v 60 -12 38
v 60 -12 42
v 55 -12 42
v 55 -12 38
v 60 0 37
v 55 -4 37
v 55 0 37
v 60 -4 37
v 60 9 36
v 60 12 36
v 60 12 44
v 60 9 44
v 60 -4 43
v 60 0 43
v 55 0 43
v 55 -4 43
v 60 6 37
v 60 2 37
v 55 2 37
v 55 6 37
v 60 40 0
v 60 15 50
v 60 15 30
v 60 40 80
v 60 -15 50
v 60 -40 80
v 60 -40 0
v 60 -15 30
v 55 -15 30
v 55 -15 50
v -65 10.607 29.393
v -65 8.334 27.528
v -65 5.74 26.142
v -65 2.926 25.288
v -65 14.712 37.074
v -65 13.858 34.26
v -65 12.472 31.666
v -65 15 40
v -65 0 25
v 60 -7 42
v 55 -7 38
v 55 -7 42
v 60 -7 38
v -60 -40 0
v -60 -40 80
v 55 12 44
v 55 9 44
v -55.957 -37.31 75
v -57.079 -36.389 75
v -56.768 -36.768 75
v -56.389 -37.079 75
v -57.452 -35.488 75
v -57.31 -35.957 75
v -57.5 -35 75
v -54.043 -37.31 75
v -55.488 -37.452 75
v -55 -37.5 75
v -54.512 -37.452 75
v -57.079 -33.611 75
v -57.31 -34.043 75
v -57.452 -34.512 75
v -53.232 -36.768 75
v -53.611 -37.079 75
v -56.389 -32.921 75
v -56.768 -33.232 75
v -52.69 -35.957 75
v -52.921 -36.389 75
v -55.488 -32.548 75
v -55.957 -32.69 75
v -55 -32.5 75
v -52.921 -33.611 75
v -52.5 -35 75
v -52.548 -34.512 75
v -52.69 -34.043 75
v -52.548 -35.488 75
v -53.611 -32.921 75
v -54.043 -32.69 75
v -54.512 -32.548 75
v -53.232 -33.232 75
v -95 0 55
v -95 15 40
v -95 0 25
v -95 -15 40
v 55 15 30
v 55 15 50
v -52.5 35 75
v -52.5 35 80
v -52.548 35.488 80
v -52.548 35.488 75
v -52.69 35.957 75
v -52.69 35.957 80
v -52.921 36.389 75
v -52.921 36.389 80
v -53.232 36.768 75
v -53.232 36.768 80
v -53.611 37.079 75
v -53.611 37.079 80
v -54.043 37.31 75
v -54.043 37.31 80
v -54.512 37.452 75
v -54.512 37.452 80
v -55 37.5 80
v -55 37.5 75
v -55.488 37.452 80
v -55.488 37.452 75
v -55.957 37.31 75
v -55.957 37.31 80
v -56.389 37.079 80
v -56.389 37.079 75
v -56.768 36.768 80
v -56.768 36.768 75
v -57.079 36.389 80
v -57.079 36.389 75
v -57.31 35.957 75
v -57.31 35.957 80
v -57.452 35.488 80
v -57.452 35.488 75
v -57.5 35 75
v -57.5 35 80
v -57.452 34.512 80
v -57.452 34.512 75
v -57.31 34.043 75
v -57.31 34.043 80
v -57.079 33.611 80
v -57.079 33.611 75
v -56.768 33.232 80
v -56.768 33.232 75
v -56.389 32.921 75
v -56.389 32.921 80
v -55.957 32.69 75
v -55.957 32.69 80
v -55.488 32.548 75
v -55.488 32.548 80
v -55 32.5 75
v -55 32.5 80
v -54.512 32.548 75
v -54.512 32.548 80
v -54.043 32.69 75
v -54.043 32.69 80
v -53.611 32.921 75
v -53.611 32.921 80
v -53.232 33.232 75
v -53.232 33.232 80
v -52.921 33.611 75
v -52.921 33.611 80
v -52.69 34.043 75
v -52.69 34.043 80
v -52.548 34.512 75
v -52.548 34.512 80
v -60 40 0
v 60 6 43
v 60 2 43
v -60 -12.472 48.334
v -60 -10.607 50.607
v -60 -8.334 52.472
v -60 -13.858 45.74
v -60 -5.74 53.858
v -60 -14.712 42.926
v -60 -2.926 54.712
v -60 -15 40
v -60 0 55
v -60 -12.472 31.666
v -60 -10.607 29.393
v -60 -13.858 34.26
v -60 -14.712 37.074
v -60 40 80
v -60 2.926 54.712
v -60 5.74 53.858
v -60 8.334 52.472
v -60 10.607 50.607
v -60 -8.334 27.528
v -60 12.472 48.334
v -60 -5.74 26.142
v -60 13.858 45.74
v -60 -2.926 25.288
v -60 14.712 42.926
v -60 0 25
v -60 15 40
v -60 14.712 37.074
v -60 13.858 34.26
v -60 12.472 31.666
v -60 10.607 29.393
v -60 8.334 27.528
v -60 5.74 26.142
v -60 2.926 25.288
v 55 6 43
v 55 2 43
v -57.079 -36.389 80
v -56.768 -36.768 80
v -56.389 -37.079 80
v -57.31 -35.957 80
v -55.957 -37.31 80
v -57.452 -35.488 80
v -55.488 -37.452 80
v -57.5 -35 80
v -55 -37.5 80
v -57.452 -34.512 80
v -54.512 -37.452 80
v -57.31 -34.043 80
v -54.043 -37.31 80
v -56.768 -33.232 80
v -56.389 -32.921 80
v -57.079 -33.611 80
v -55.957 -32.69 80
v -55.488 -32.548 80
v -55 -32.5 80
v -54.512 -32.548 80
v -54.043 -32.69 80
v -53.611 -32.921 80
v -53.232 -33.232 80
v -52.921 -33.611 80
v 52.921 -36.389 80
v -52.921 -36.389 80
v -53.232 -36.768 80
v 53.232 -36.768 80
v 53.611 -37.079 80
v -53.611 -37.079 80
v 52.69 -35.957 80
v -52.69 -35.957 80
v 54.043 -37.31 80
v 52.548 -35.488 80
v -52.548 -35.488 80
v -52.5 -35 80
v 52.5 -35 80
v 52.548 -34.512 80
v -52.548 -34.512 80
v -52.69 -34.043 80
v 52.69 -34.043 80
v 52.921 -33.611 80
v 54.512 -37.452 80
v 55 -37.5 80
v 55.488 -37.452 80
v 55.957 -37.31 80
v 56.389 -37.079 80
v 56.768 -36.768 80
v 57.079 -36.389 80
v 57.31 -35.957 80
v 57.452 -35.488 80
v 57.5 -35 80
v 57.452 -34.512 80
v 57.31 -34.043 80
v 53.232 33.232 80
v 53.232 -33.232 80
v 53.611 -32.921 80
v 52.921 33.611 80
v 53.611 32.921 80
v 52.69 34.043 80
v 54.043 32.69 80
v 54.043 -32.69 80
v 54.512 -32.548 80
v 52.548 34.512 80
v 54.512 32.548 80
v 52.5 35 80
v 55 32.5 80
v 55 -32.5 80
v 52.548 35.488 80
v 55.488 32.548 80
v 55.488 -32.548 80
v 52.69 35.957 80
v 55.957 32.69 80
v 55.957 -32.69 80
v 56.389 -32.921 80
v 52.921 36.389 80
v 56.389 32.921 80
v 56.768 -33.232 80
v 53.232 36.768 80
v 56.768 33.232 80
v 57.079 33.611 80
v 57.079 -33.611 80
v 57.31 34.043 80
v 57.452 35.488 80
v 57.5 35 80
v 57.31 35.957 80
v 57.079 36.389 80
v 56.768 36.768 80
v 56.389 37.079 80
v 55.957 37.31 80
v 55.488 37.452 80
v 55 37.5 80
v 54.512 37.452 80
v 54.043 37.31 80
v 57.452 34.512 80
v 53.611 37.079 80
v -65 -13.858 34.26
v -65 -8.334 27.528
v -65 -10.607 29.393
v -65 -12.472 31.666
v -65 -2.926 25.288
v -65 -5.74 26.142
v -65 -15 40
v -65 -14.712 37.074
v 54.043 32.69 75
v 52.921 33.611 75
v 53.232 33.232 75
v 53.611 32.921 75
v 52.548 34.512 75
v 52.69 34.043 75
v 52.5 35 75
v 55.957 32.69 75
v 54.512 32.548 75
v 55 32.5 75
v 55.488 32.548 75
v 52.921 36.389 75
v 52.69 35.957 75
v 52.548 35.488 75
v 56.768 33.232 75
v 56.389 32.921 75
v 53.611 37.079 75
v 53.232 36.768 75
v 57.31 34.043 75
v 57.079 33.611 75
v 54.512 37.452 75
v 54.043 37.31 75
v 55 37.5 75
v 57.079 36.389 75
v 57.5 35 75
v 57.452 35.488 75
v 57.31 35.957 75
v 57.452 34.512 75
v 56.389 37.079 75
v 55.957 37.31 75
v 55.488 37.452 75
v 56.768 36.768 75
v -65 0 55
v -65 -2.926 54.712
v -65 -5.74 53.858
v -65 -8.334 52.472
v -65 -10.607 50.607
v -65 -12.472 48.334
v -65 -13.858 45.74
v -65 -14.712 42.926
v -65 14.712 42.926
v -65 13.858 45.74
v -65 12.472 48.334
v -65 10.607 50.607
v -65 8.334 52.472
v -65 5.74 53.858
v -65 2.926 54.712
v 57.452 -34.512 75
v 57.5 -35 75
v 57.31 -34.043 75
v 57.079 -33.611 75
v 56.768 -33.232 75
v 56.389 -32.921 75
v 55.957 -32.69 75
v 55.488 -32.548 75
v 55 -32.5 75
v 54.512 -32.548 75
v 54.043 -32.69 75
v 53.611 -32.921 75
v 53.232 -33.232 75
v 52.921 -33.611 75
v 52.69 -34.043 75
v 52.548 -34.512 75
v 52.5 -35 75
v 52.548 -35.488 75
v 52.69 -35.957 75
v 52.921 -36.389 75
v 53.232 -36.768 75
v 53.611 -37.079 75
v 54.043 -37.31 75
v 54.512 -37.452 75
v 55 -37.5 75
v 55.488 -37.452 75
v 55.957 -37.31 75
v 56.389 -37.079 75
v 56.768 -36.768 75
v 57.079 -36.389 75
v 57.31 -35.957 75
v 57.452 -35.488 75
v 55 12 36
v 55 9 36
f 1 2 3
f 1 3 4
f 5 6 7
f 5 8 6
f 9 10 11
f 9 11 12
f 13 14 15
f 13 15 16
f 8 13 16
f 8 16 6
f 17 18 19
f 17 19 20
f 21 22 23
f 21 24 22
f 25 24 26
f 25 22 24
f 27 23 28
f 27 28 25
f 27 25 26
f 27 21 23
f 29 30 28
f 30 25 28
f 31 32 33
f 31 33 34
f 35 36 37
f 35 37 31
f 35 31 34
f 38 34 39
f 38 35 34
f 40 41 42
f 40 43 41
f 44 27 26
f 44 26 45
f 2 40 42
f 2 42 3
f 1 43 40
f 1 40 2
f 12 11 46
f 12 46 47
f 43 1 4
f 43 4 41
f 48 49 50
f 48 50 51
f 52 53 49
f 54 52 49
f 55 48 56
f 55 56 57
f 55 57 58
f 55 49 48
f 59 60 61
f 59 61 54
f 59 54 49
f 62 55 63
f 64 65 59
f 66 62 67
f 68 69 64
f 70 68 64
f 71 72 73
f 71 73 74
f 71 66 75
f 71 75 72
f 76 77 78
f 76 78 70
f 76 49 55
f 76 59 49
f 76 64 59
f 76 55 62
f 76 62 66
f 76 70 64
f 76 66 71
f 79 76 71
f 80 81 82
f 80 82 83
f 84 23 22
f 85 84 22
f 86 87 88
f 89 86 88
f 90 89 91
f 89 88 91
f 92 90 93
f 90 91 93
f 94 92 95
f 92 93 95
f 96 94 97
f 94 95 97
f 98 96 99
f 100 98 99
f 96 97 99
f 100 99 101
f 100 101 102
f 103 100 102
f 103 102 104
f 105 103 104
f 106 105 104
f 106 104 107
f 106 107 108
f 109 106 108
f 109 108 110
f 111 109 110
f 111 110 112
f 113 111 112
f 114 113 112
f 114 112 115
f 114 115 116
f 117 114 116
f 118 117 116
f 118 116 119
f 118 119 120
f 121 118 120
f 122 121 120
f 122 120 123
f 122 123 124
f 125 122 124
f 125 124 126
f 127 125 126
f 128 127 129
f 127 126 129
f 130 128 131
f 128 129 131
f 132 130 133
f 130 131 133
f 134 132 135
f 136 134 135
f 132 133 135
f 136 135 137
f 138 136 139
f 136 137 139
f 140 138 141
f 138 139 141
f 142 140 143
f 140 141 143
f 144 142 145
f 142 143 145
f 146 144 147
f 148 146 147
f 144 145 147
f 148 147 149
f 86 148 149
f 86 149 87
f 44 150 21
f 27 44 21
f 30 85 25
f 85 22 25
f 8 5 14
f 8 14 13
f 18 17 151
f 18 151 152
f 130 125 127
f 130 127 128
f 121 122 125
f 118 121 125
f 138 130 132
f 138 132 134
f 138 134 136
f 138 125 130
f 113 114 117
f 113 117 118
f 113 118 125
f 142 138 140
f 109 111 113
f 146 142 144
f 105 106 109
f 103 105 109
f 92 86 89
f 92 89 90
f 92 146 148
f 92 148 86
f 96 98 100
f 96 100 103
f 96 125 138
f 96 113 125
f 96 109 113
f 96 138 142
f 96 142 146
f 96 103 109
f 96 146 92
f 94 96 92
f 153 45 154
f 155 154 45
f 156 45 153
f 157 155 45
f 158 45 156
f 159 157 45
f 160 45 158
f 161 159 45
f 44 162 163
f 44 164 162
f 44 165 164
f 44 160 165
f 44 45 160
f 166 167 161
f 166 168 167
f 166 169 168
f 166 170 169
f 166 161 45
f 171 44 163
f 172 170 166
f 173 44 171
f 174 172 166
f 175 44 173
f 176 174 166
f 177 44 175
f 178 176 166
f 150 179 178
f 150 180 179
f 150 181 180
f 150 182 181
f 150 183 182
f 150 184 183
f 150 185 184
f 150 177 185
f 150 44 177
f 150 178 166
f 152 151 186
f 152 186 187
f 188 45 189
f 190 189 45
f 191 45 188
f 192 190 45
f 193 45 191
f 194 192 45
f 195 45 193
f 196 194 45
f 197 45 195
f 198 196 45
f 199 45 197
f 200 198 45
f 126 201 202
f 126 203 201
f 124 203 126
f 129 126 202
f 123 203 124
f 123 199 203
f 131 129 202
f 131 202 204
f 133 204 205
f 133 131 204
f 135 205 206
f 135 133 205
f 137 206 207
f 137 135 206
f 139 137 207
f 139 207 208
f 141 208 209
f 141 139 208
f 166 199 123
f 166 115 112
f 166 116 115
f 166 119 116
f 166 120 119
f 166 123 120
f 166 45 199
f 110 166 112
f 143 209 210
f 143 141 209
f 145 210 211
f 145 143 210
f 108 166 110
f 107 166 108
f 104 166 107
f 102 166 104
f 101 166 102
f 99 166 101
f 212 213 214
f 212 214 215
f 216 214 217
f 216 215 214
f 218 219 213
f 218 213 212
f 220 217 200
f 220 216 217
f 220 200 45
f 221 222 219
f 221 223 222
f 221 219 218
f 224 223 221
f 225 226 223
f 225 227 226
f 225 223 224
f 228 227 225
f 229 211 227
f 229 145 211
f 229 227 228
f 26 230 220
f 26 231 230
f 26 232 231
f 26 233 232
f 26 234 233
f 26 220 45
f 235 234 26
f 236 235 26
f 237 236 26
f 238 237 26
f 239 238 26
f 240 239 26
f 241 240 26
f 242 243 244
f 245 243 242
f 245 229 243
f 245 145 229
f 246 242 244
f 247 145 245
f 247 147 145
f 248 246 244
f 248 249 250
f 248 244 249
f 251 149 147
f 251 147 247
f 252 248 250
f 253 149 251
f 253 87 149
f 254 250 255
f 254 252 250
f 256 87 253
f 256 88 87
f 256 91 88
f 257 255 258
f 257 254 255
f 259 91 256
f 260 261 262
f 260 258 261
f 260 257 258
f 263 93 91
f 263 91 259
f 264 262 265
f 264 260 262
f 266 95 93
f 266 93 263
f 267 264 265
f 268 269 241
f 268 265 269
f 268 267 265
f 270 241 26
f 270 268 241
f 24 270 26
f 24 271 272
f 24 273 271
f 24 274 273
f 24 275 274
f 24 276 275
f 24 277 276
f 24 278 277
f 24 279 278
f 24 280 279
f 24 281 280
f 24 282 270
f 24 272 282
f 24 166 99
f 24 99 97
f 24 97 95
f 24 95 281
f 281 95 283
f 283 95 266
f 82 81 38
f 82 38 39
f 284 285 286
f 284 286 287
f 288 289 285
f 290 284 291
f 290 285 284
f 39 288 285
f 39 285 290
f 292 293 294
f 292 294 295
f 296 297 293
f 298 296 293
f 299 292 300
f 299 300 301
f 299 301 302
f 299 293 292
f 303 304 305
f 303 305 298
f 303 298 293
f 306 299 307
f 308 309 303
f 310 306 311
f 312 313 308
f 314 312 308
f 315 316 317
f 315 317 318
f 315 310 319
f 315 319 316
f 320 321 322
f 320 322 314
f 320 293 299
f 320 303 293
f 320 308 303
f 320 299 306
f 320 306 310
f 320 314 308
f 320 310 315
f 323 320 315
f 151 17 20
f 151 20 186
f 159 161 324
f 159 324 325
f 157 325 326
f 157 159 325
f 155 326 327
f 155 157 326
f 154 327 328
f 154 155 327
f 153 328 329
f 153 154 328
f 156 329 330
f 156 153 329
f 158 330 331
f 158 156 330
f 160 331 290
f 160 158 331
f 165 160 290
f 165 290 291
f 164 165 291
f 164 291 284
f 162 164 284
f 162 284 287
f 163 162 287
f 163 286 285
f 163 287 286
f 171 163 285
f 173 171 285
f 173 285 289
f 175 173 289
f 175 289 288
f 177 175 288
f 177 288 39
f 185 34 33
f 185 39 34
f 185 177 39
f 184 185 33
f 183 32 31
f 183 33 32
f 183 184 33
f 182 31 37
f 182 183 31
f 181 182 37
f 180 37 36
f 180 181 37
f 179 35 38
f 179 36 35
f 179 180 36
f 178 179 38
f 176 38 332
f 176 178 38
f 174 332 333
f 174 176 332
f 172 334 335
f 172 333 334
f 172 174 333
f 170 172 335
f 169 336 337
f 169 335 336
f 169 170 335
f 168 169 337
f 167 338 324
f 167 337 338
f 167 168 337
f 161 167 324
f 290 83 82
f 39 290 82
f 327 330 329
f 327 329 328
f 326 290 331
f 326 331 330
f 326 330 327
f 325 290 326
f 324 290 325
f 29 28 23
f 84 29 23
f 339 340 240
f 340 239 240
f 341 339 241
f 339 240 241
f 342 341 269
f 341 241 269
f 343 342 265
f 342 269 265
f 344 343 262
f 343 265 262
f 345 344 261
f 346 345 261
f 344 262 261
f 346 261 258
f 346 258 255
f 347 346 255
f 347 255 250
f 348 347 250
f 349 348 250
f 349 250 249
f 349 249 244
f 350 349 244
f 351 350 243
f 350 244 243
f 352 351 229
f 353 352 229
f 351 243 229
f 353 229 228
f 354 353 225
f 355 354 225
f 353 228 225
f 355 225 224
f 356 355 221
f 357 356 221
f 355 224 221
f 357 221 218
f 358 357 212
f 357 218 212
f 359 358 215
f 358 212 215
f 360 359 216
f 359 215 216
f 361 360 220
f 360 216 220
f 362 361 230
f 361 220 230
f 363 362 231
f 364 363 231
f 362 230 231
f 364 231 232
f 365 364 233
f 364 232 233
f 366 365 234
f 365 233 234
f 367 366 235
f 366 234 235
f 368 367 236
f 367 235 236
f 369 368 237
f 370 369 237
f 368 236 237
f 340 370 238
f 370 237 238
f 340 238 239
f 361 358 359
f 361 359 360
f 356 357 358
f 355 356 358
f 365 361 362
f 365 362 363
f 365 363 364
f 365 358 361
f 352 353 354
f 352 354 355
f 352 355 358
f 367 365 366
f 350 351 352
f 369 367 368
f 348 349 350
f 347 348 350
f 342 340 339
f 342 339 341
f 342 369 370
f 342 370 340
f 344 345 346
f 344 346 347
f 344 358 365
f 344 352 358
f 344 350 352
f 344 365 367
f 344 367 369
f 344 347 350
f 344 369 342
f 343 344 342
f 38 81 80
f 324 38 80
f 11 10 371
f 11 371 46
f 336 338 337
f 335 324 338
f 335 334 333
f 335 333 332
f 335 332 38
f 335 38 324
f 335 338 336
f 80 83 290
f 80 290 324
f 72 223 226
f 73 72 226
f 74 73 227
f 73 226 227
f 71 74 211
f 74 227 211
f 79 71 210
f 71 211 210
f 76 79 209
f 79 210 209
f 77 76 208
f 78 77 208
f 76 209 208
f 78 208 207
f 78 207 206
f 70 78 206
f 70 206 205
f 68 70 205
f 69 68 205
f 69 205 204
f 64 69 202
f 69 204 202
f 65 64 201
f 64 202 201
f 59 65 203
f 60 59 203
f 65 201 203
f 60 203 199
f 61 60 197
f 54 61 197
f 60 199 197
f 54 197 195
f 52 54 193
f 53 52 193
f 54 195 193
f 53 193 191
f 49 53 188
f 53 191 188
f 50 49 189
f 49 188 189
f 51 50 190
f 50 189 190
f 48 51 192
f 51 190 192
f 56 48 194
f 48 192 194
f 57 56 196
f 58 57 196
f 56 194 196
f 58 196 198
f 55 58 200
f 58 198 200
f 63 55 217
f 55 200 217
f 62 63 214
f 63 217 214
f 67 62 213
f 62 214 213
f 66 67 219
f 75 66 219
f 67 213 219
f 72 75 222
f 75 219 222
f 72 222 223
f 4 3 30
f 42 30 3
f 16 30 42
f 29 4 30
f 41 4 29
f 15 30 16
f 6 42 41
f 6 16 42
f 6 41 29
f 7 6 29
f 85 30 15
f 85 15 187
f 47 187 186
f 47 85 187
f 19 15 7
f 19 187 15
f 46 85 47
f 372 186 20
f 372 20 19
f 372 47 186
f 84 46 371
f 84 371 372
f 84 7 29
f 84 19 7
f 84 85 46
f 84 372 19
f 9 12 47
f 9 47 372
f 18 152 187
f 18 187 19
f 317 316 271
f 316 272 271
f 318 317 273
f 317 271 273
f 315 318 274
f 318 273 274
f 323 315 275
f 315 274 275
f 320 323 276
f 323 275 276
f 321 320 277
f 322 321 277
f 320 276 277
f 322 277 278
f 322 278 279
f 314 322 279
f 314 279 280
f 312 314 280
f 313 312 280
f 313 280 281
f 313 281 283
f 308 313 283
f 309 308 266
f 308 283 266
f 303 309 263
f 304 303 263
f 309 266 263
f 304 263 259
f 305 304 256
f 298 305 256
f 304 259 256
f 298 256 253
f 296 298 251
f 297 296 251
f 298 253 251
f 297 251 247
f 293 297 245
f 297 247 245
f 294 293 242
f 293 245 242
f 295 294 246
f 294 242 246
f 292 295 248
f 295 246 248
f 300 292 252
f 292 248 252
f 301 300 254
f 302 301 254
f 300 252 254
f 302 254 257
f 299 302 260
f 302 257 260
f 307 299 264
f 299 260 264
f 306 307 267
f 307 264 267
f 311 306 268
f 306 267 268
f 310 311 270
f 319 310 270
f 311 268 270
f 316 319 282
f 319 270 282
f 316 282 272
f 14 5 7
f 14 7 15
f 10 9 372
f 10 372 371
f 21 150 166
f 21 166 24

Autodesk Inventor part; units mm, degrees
ref_plane "YZ Plane" through (0, 0, 0) normal (1, 0, 0) x (0, 1, 0)
ref_plane "XZ Plane" through (0, 0, 0) normal (0, 1, 0) x (-1, 0, 0)
ref_plane "XY Plane" through (0, 0, 0) normal (0, 0, 1) x (1, 0, 0)
sketch "Sketch1" plane through (0, 0, 0) normal (0, 0, 1) x (1, 0, 0)
  line L0 (-60, 40) -> (60, 40)
  line L1 (60, 40) -> (60, -40)
  line L2 (60, -40) -> (-60, -40)
  line L3 (-60, -40) -> (-60, 40)
  point P0 (0, 0)
  point P1 (-60, 0)
  point P2 (0, 40)
  dimension "d0" = 120
  dimension "d1" = 80
extrude "Extrusion1" add sketch "Sketch1" along normal blind 80
sketch "Sketch4" plane through (-60, -40, 0) normal (-1, 0, 0) x (0, 0, 1)
  circle A0 centre (40, 40) radius 15
  line L0 (0, 0) -> (0, 80) projected
  line L1 (0, 80) -> (80, 80) projected
  point P0 (0, 40)
  point P1 (0, 40)
  point P2 (40, 80)
  dimension "d12" = 30
extrude "Extrusion2" add sketch "Sketch4" along normal blind 35
sketch "Sketch7" plane through (-95, 0, 40) normal (-1, 0, 0) x (0, 0, 1)
  circle A0 centre (0, 0) radius 15 projected
  line L0 (0, 15) -> (15, 0)
  line L1 (0, -15) -> (15, 0)
  line L2 (0, -15) -> (-15, 0)
  line L3 (0, 15) -> (-15, 0)
  point P0 (-40, 0)
extrude "Extrusion3" cut sketch "Sketch7" against normal blind 30 contours L0 A0 | A0 L1 | L3 A0 | A0 L2
sketch "Sketch8" plane through (60, -40, 0) normal (1, 0, 0) x (0, 0, -1)
  line L0 (-50, 25) -> (-30, 25)
  line L1 (-30, 25) -> (-30, 55)
  line L2 (-30, 55) -> (-50, 55)
  line L3 (-50, 55) -> (-50, 25)
  line L4 (0, 0) -> (-80, 0) projected
  line L5 (-80, 0) -> (-80, 80) projected
  line L6 (-38, 33) -> (-42, 33)
  line L7 (-42, 33) -> (-42, 28)
  line L8 (-42, 28) -> (-38, 28)
  line L9 (-38, 28) -> (-38, 33)
  line L10 (-37, 40) -> (-43, 40)
  line L11 (-43, 40) -> (-43, 36)
  line L12 (-43, 36) -> (-37, 36)
  line L13 (-37, 36) -> (-37, 40)
  line L14 (-37, 46) -> (-43, 46)
  line L15 (-43, 46) -> (-43, 42)
  line L16 (-43, 42) -> (-37, 42)
  line L17 (-37, 42) -> (-37, 46)
  line L18 (-44, 49) -> (-36, 49)
  line L19 (-36, 49) -> (-36, 52)
  line L20 (-36, 52) -> (-44, 52)
  line L21 (-44, 52) -> (-44, 49)
  point P0 (0, 40)
  point P1 (-40, 25)
  point P2 (-40, 0)
  point P3 (-50, 40)
  point P4 (-80, 40)
  point P5 (-40, 28)
  point P6 (-40, 36)
  point P7 (-40, 42)
  point P8 (-40, 52)
  point P9 (-40, 55)
  dimension "d17" = 30
  dimension "d18" = 20
  dimension "d19" = 5
  dimension "d20" = 4
  dimension "d21" = 4
  dimension "d22" = 6
  dimension "d23" = 6
  dimension "d24" = 4
  dimension "d27" = 3
  dimension "d28" = 8
  dimension "d29" = 3
  dimension "d30" = 2
  dimension "d31" = 3
  dimension "d32" = 3
extrude "Extrusion4" cut sketch "Sketch8" against normal blind 5
sketch "Sketch9" plane through (0, 0, 80) normal (0, 0, 1) x (1, 0, 0)
  circle A0 centre (-55, 35) radius 2.5
  line L0 (-60, 40) -> (-60, -40) projected
  line L1 (60, 40) -> (-60, 40) projected
  circle A1 centre (55, 35) radius 2.5
  circle A2 centre (-55, -35) radius 2.5
  circle A3 centre (55, -35) radius 2.5
  point P0 (0, 0)
  dimension "d35" = 5
  dimension "d36" = 5
  dimension "d37" = 5
  dimension "d40" = 110
  dimension "d43" = 70
extrude "Extrusion5" cut sketch "Sketch9" against normal blind 5
properties part number "motor"
